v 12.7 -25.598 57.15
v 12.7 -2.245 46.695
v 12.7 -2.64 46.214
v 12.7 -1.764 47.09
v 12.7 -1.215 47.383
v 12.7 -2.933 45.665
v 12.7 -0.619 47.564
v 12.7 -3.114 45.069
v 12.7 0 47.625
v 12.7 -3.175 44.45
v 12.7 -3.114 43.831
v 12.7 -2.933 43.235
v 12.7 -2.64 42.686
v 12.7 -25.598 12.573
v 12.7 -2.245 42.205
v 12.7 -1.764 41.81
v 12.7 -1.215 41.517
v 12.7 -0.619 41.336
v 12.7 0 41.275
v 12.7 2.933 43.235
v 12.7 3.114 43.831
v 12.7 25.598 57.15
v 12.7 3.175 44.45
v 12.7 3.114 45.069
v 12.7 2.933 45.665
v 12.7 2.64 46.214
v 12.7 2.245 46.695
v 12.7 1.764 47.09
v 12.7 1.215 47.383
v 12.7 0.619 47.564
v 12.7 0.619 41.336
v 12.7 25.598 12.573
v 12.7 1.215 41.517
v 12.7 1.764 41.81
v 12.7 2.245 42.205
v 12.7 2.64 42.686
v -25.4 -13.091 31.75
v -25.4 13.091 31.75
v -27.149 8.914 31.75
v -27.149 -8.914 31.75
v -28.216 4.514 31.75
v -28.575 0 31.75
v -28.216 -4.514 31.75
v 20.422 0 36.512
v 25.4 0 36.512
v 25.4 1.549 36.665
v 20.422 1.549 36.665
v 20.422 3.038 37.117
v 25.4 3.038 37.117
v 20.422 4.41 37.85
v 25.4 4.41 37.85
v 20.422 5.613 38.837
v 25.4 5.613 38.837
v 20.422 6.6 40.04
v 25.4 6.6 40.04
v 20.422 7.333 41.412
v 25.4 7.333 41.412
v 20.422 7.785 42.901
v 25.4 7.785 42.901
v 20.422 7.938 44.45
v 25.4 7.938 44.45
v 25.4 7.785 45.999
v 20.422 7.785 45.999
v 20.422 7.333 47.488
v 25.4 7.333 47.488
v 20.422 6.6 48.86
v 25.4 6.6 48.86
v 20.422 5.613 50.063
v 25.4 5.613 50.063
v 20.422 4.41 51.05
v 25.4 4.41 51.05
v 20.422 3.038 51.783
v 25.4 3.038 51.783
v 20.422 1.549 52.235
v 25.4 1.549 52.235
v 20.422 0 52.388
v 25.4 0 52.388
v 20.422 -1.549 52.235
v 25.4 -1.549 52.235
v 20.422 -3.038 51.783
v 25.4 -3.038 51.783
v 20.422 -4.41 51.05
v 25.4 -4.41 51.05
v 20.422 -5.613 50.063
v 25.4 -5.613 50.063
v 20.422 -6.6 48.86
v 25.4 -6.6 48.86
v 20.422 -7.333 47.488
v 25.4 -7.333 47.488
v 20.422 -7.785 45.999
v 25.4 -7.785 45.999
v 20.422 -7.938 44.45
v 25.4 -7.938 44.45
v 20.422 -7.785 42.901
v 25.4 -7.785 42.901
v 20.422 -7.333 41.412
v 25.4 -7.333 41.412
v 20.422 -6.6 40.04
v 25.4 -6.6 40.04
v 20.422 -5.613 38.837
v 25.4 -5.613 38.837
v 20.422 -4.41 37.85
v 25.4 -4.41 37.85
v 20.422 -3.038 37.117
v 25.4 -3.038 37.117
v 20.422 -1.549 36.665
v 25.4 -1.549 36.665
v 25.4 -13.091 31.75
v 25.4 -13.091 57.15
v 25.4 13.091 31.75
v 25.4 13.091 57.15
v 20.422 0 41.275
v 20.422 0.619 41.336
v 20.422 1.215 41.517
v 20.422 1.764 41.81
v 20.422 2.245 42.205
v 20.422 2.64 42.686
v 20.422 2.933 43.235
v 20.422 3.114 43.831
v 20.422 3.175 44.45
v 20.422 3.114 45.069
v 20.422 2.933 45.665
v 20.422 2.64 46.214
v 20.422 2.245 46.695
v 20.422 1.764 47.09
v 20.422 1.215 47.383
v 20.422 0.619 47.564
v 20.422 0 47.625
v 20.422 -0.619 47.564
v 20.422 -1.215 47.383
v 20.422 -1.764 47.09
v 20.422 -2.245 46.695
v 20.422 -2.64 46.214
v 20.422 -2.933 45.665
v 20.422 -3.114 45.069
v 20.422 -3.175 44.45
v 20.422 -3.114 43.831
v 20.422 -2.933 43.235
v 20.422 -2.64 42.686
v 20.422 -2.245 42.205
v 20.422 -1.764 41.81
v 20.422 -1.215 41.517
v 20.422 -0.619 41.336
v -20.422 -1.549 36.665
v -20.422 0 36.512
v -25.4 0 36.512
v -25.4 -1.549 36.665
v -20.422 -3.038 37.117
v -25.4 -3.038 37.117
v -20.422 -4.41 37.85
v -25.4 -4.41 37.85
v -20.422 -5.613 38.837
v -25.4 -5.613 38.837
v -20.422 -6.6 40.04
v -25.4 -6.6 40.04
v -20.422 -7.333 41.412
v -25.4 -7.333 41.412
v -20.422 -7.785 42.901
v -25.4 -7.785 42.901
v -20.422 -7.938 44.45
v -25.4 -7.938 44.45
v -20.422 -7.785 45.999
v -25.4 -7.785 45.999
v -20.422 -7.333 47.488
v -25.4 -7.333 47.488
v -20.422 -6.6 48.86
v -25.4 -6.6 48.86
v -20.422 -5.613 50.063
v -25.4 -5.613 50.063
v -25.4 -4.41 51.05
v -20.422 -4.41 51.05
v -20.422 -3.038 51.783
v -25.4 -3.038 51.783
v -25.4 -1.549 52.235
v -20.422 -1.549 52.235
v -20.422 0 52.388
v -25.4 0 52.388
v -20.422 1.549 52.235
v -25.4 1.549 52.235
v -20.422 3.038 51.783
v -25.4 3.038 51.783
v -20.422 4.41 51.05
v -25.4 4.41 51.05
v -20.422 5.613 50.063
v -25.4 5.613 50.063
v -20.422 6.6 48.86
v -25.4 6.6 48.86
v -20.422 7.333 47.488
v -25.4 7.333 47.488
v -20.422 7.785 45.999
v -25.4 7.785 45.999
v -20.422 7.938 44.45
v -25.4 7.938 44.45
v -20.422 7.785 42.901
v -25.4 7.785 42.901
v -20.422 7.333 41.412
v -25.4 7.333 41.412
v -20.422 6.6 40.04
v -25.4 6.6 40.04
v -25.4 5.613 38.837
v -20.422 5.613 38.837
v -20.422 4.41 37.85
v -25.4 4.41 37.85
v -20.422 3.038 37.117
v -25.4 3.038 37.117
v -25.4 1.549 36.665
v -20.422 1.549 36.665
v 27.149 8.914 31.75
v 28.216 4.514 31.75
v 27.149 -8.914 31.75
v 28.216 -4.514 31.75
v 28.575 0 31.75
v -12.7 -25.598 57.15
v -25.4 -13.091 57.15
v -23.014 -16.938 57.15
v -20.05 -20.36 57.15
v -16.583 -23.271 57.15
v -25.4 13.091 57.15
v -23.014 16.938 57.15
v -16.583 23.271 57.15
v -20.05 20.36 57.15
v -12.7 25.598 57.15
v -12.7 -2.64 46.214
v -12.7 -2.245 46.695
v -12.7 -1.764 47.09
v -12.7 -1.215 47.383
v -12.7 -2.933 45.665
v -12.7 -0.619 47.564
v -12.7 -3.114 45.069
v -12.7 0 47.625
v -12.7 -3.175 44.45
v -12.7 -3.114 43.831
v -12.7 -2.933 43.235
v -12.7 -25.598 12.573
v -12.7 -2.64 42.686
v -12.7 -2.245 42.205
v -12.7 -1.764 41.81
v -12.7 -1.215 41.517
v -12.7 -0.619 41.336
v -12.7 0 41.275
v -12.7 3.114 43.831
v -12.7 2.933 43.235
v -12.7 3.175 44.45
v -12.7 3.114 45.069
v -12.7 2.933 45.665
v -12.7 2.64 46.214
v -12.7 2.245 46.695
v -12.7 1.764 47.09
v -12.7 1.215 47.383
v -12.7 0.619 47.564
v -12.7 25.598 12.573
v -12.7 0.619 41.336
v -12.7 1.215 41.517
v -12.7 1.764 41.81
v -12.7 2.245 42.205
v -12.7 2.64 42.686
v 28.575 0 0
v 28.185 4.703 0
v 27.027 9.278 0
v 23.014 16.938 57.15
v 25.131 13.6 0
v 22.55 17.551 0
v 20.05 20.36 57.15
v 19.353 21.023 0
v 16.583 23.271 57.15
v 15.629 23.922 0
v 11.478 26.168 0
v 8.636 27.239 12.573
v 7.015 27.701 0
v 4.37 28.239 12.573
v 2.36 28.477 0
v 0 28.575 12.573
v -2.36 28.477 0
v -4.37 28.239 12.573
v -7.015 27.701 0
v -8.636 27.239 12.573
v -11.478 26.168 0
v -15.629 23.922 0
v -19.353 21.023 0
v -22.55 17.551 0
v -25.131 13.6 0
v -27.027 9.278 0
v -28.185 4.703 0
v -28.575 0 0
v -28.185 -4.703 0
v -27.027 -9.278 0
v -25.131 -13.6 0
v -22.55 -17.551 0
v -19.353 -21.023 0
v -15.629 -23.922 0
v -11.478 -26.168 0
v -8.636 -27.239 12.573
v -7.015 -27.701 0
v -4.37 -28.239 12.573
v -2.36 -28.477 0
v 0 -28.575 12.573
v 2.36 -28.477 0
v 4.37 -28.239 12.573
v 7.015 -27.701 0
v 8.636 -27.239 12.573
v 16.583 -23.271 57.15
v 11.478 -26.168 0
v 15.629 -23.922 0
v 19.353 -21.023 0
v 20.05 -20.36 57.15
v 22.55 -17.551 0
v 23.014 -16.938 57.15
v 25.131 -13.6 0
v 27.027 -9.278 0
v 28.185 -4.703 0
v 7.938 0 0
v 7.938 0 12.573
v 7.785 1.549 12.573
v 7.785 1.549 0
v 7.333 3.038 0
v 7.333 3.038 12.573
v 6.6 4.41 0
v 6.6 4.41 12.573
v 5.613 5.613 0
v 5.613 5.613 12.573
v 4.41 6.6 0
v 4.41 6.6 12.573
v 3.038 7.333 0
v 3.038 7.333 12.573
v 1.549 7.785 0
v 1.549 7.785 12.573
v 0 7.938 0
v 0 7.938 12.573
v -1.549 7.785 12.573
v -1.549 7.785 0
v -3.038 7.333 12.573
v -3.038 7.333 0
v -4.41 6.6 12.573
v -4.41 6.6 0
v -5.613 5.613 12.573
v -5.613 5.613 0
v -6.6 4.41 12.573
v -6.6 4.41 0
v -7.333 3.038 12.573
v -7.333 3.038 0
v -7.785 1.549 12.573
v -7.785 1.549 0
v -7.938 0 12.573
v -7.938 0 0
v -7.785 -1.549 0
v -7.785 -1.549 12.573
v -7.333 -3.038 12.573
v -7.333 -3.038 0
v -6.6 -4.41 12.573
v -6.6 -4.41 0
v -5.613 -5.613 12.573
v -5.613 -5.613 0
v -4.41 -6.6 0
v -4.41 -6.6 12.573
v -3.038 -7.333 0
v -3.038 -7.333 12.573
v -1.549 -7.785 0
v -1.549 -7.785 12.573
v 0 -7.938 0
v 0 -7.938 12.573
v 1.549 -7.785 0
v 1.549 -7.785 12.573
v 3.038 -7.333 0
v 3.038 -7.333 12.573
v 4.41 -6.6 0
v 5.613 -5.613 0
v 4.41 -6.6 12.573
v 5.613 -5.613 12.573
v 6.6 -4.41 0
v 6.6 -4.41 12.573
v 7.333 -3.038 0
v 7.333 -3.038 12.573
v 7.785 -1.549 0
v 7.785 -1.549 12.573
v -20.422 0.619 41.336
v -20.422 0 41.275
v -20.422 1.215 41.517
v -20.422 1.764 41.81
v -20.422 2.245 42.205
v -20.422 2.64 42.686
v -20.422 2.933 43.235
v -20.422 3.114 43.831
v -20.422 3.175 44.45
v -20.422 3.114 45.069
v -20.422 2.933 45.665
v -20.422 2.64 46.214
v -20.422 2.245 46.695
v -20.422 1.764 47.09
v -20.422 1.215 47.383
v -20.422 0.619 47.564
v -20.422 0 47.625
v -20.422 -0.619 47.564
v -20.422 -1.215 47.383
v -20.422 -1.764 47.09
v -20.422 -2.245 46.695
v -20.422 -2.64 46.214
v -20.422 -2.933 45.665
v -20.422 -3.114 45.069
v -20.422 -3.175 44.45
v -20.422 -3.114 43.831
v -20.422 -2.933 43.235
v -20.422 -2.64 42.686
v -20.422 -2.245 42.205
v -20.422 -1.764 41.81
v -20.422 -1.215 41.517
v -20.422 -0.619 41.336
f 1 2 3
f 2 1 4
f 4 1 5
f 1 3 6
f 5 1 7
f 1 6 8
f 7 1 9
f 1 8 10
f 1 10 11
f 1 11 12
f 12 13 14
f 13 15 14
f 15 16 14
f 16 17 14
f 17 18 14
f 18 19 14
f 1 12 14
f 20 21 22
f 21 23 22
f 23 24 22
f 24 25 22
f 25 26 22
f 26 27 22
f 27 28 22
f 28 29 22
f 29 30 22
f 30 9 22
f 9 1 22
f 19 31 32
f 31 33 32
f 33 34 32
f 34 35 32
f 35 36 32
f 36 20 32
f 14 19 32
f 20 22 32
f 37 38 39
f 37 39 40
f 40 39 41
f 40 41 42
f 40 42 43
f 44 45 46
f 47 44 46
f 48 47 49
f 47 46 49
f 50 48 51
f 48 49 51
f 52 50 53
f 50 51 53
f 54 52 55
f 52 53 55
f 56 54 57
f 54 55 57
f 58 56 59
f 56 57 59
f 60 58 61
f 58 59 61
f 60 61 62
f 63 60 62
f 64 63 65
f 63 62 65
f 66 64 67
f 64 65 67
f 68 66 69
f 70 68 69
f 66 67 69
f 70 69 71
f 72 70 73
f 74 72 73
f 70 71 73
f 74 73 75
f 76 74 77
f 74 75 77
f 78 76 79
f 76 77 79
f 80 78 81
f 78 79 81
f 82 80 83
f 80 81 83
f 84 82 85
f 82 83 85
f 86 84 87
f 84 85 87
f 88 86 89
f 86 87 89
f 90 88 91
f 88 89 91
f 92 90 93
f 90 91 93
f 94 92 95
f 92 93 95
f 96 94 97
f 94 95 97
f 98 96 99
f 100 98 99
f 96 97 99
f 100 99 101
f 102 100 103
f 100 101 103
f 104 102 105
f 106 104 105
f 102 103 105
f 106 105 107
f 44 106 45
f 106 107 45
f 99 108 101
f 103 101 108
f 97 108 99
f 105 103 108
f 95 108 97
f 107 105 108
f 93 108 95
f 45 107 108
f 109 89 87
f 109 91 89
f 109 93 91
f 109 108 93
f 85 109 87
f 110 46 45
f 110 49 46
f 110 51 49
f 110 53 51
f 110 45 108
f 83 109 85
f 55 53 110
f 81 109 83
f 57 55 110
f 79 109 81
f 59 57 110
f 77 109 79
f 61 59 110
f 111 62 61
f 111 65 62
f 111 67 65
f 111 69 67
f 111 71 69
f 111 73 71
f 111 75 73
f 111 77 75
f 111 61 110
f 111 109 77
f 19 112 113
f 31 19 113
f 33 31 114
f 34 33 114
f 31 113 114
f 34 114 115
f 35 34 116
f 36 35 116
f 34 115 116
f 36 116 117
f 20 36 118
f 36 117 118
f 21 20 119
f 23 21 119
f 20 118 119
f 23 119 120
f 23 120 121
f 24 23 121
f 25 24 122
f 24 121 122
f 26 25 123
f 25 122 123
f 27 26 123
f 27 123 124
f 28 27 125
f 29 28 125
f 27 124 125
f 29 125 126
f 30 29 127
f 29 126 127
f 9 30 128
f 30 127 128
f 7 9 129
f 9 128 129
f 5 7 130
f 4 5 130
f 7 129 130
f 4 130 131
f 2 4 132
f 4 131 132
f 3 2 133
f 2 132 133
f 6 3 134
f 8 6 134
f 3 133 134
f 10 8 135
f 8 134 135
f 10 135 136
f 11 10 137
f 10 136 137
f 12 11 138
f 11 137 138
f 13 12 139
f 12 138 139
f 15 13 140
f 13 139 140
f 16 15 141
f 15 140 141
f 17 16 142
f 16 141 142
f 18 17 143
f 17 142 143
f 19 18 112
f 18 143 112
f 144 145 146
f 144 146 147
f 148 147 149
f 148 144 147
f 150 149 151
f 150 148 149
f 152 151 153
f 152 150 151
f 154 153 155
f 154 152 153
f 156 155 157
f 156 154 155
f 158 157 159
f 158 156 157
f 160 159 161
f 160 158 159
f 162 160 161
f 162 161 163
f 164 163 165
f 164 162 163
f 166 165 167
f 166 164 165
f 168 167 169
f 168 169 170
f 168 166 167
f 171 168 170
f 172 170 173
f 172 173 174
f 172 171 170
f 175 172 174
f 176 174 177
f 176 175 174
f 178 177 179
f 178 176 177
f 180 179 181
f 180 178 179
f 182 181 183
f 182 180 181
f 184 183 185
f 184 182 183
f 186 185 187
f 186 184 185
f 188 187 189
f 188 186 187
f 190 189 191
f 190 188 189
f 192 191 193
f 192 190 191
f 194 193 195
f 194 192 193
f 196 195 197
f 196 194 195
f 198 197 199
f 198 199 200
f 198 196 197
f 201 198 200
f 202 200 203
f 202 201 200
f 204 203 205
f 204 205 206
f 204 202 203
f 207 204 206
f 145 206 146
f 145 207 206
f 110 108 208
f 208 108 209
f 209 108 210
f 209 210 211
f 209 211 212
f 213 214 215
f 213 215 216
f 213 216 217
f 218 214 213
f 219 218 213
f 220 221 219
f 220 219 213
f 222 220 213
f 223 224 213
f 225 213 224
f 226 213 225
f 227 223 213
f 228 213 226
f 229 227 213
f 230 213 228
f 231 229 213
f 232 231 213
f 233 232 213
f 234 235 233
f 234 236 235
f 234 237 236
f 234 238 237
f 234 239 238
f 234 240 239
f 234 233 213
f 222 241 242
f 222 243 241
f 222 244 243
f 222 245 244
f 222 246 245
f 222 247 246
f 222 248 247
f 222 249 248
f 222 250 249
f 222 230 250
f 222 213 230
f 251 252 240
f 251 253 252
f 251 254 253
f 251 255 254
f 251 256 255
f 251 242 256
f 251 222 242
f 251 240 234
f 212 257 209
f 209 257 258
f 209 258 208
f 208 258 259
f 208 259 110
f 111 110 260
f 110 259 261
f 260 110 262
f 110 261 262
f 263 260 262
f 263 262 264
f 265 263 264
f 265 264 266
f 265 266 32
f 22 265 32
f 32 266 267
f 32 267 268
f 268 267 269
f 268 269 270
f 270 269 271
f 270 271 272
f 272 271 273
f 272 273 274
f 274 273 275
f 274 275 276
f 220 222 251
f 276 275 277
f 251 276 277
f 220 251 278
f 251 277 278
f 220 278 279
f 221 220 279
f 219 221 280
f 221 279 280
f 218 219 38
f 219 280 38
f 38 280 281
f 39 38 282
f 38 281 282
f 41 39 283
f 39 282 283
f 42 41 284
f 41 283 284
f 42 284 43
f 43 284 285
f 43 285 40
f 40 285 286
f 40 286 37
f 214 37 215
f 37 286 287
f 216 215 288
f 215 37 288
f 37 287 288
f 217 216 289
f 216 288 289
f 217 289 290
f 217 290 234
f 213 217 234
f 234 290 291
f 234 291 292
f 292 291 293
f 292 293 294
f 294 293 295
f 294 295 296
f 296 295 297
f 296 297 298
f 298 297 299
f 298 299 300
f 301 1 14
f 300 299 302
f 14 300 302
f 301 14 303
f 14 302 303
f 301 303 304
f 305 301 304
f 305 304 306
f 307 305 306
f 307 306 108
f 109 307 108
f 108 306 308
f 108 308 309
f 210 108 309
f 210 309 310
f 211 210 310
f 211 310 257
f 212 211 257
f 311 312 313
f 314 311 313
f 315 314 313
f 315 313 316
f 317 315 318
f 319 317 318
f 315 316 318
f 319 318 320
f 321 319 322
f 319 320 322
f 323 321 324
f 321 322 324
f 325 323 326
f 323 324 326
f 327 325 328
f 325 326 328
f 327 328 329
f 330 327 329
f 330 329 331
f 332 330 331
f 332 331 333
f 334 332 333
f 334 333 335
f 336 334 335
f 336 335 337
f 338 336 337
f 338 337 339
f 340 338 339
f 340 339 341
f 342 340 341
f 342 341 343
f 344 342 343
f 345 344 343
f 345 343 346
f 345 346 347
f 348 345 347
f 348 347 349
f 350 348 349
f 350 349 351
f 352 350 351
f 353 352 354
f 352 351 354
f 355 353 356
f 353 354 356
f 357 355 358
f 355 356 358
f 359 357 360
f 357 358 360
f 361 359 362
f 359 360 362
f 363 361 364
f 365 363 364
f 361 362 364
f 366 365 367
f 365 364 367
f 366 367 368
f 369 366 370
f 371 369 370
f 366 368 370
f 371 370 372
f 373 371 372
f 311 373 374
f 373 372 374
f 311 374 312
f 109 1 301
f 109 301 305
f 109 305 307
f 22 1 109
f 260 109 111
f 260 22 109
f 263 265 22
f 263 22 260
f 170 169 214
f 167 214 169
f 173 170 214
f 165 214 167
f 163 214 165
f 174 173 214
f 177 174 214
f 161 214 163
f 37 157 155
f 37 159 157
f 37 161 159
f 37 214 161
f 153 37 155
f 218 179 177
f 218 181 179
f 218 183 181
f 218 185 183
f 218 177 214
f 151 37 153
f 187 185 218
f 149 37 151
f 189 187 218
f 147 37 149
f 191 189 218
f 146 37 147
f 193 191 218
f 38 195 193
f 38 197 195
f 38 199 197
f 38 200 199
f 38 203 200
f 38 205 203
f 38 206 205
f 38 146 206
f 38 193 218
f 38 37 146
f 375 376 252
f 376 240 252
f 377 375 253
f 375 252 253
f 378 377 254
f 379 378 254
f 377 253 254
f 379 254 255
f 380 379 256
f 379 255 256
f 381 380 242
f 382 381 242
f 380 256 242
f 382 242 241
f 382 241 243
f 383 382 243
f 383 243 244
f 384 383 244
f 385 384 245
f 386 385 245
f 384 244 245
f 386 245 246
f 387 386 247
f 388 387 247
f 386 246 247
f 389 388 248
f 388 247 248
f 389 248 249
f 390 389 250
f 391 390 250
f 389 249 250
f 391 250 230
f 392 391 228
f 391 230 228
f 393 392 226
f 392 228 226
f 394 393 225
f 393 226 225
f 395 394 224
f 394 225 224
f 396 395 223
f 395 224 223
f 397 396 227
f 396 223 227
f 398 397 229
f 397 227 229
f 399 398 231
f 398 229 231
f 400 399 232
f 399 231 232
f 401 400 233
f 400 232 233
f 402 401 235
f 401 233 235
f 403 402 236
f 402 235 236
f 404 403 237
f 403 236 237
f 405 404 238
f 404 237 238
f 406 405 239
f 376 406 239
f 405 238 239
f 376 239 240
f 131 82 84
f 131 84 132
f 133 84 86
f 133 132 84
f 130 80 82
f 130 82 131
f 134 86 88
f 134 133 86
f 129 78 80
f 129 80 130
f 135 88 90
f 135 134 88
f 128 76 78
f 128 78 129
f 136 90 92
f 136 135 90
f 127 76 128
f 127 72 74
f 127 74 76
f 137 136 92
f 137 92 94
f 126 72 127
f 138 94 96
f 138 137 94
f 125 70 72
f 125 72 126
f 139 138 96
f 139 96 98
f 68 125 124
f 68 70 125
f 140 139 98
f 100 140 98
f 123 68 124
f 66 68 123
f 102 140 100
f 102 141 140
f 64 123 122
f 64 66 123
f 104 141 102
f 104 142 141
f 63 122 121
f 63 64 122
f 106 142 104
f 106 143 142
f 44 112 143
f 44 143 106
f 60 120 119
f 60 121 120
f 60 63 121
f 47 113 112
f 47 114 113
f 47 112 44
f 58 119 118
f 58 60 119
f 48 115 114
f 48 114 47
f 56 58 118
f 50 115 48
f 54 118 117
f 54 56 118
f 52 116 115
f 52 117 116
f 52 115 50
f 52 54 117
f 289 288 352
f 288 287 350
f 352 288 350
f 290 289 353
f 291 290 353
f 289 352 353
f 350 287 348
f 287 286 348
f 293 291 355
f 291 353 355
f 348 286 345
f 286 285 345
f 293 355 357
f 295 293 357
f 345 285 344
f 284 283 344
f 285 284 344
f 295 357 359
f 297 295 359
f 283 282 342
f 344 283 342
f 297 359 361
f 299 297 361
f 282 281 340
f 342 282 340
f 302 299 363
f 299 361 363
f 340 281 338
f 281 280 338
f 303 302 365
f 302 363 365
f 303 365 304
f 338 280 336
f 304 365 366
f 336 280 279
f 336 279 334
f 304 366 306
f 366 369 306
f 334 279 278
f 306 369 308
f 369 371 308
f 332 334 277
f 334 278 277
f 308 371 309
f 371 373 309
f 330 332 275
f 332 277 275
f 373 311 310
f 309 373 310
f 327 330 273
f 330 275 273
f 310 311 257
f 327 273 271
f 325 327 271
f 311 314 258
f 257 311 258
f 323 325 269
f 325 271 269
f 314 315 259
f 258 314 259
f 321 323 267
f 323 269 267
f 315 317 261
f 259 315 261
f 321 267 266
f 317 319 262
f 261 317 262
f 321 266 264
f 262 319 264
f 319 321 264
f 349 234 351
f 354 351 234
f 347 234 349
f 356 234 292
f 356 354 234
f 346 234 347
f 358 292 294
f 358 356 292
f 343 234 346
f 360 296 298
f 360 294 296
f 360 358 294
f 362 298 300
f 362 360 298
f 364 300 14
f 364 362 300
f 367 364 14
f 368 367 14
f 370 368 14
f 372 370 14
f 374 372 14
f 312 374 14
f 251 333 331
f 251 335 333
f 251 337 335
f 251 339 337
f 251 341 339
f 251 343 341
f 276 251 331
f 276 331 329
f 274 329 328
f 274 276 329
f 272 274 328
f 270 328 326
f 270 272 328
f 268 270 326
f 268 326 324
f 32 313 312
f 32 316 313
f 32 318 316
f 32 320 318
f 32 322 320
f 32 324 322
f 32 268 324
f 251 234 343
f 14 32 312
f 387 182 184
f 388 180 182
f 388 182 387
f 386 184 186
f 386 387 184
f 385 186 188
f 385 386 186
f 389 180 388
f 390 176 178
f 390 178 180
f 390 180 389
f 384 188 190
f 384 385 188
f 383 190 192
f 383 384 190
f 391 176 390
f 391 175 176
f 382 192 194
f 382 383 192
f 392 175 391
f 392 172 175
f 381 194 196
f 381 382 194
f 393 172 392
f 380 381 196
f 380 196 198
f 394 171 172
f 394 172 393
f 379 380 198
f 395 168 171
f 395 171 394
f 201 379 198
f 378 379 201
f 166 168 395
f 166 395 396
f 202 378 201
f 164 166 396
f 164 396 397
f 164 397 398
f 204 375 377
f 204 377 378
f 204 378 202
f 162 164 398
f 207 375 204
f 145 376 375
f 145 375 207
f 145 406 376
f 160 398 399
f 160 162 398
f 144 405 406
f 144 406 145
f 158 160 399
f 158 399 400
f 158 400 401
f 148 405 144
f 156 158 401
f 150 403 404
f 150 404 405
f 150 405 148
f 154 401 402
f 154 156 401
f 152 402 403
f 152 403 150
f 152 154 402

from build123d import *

# Parameters (mm, degrees)
SKETCH1_R                = 28.575
OD_DON_T_CARE_DEPTH      = 57.15
SKETCH3_W                = 25.4
SKETCH3_H                = 44.577
SLOT_DEPTH               = 50.8
SKETCH4_R                = 7.9375
F_5_8_THROUGH_HOLE_DEPTH = 61.167850045
SKETCH5_OUTSIDE_W        = 78.948
SKETCH5_OUTSIDE_H        = 78.948
SKETCH5_OUTSIDE_W_2      = 53.975
SKETCH5_OUTSIDE_H_2      = 51.195336702
FLAT_SURFACE_DEPTH       = 25.4
SKETCH2_R                = 3.175
F_1_4_THROUGH_HOLE_DEPTH = 84.641818189
SKETCH6_R                = 7.9375
CUT_EXTRUDE1_DEPTH       = 4.9784
CUT_EXTRUDE2_DEPTH       = 70.994169563
CUT_EXTRUDE2_DEPTH_BACK  = 25.4
CUT_EXTRUDE3_START       = -4.9784
SKETCH8_R                = 7.9375
CUT_EXTRUDE3_DEPTH       = 4.9784


with BuildPart() as part:
    # Sketch1 → OD Don't Care (new body)
    with BuildSketch(Plane.XY):
        Circle(SKETCH1_R)
    extrude(amount=OD_DON_T_CARE_DEPTH)

    # Sketch3 → Slot (cut, symmetric)
    with BuildSketch(Plane(origin=(0, 0, 0), x_dir=(1, 0, 0), z_dir=(0, 1, 0))):
        with Locations((0, -34.8615)):
            Rectangle(SKETCH3_W, SKETCH3_H)
    extrude(amount=SLOT_DEPTH, both=True, mode=Mode.SUBTRACT)

    # Sketch4 → 5/8" Through Hole (cut, through all)
    with BuildSketch(Plane.XY.offset(12.573)):
        Circle(SKETCH4_R)
    extrude(amount=-F_5_8_THROUGH_HOLE_DEPTH, mode=Mode.SUBTRACT)

    # Sketch5 outside → Flat Surface (cut)
    with BuildSketch(Plane.XY.offset(57.15)):
        Rectangle(SKETCH5_OUTSIDE_W, SKETCH5_OUTSIDE_H)
        with Locations((-1.5875, 0)):
            Rectangle(SKETCH5_OUTSIDE_W_2, SKETCH5_OUTSIDE_H_2, mode=Mode.SUBTRACT)
    extrude(amount=-FLAT_SURFACE_DEPTH, mode=Mode.SUBTRACT)

    # Sketch2 → 1/4" Through Hole (cut, through all)
    with BuildSketch(Plane(origin=(25.4, 0, 0), x_dir=(0, 0, -1), z_dir=(1, 0, 0))):
        with Locations((-44.45, 0)):
            Circle(SKETCH2_R)
    extrude(amount=-F_1_4_THROUGH_HOLE_DEPTH, mode=Mode.SUBTRACT)

    # Sketch6 → Cut-Extrude1 (cut)
    with BuildSketch(Plane(origin=(25.4, 0, 0), x_dir=(0, 0, -1), z_dir=(1, 0, 0))):
        with Locations((-44.45, 0)):
            Circle(SKETCH6_R)
    extrude(amount=-CUT_EXTRUDE1_DEPTH, mode=Mode.SUBTRACT)

    # Sketch7 → Cut-Extrude2 (cut, two sides: drawn at the far end of the back side and taken through both)
    with BuildSketch(Plane.XY.offset(57.15).offset(-CUT_EXTRUDE2_DEPTH_BACK)):
        Polygon((-25.4, -159.463065209), (-25.4, -13.090860361), (-25.4, 13.090860361), (-25.4, 159.463065209), (-318.144409696, 159.463065209), (-318.144409696, -159.463065209), align=None)
    extrude(amount=CUT_EXTRUDE2_DEPTH + CUT_EXTRUDE2_DEPTH_BACK, mode=Mode.SUBTRACT)

    # Sketch8 → Cut-Extrude3 (cut)
    with BuildSketch(Plane.ZY.offset(25.4).offset(CUT_EXTRUDE3_START)):
        with Locations(Location((44.45, 0, 0), (0, 0, 180))):
            Circle(SKETCH8_R)
    extrude(amount=CUT_EXTRUDE3_DEPTH, mode=Mode.SUBTRACT)


solid = part.part
